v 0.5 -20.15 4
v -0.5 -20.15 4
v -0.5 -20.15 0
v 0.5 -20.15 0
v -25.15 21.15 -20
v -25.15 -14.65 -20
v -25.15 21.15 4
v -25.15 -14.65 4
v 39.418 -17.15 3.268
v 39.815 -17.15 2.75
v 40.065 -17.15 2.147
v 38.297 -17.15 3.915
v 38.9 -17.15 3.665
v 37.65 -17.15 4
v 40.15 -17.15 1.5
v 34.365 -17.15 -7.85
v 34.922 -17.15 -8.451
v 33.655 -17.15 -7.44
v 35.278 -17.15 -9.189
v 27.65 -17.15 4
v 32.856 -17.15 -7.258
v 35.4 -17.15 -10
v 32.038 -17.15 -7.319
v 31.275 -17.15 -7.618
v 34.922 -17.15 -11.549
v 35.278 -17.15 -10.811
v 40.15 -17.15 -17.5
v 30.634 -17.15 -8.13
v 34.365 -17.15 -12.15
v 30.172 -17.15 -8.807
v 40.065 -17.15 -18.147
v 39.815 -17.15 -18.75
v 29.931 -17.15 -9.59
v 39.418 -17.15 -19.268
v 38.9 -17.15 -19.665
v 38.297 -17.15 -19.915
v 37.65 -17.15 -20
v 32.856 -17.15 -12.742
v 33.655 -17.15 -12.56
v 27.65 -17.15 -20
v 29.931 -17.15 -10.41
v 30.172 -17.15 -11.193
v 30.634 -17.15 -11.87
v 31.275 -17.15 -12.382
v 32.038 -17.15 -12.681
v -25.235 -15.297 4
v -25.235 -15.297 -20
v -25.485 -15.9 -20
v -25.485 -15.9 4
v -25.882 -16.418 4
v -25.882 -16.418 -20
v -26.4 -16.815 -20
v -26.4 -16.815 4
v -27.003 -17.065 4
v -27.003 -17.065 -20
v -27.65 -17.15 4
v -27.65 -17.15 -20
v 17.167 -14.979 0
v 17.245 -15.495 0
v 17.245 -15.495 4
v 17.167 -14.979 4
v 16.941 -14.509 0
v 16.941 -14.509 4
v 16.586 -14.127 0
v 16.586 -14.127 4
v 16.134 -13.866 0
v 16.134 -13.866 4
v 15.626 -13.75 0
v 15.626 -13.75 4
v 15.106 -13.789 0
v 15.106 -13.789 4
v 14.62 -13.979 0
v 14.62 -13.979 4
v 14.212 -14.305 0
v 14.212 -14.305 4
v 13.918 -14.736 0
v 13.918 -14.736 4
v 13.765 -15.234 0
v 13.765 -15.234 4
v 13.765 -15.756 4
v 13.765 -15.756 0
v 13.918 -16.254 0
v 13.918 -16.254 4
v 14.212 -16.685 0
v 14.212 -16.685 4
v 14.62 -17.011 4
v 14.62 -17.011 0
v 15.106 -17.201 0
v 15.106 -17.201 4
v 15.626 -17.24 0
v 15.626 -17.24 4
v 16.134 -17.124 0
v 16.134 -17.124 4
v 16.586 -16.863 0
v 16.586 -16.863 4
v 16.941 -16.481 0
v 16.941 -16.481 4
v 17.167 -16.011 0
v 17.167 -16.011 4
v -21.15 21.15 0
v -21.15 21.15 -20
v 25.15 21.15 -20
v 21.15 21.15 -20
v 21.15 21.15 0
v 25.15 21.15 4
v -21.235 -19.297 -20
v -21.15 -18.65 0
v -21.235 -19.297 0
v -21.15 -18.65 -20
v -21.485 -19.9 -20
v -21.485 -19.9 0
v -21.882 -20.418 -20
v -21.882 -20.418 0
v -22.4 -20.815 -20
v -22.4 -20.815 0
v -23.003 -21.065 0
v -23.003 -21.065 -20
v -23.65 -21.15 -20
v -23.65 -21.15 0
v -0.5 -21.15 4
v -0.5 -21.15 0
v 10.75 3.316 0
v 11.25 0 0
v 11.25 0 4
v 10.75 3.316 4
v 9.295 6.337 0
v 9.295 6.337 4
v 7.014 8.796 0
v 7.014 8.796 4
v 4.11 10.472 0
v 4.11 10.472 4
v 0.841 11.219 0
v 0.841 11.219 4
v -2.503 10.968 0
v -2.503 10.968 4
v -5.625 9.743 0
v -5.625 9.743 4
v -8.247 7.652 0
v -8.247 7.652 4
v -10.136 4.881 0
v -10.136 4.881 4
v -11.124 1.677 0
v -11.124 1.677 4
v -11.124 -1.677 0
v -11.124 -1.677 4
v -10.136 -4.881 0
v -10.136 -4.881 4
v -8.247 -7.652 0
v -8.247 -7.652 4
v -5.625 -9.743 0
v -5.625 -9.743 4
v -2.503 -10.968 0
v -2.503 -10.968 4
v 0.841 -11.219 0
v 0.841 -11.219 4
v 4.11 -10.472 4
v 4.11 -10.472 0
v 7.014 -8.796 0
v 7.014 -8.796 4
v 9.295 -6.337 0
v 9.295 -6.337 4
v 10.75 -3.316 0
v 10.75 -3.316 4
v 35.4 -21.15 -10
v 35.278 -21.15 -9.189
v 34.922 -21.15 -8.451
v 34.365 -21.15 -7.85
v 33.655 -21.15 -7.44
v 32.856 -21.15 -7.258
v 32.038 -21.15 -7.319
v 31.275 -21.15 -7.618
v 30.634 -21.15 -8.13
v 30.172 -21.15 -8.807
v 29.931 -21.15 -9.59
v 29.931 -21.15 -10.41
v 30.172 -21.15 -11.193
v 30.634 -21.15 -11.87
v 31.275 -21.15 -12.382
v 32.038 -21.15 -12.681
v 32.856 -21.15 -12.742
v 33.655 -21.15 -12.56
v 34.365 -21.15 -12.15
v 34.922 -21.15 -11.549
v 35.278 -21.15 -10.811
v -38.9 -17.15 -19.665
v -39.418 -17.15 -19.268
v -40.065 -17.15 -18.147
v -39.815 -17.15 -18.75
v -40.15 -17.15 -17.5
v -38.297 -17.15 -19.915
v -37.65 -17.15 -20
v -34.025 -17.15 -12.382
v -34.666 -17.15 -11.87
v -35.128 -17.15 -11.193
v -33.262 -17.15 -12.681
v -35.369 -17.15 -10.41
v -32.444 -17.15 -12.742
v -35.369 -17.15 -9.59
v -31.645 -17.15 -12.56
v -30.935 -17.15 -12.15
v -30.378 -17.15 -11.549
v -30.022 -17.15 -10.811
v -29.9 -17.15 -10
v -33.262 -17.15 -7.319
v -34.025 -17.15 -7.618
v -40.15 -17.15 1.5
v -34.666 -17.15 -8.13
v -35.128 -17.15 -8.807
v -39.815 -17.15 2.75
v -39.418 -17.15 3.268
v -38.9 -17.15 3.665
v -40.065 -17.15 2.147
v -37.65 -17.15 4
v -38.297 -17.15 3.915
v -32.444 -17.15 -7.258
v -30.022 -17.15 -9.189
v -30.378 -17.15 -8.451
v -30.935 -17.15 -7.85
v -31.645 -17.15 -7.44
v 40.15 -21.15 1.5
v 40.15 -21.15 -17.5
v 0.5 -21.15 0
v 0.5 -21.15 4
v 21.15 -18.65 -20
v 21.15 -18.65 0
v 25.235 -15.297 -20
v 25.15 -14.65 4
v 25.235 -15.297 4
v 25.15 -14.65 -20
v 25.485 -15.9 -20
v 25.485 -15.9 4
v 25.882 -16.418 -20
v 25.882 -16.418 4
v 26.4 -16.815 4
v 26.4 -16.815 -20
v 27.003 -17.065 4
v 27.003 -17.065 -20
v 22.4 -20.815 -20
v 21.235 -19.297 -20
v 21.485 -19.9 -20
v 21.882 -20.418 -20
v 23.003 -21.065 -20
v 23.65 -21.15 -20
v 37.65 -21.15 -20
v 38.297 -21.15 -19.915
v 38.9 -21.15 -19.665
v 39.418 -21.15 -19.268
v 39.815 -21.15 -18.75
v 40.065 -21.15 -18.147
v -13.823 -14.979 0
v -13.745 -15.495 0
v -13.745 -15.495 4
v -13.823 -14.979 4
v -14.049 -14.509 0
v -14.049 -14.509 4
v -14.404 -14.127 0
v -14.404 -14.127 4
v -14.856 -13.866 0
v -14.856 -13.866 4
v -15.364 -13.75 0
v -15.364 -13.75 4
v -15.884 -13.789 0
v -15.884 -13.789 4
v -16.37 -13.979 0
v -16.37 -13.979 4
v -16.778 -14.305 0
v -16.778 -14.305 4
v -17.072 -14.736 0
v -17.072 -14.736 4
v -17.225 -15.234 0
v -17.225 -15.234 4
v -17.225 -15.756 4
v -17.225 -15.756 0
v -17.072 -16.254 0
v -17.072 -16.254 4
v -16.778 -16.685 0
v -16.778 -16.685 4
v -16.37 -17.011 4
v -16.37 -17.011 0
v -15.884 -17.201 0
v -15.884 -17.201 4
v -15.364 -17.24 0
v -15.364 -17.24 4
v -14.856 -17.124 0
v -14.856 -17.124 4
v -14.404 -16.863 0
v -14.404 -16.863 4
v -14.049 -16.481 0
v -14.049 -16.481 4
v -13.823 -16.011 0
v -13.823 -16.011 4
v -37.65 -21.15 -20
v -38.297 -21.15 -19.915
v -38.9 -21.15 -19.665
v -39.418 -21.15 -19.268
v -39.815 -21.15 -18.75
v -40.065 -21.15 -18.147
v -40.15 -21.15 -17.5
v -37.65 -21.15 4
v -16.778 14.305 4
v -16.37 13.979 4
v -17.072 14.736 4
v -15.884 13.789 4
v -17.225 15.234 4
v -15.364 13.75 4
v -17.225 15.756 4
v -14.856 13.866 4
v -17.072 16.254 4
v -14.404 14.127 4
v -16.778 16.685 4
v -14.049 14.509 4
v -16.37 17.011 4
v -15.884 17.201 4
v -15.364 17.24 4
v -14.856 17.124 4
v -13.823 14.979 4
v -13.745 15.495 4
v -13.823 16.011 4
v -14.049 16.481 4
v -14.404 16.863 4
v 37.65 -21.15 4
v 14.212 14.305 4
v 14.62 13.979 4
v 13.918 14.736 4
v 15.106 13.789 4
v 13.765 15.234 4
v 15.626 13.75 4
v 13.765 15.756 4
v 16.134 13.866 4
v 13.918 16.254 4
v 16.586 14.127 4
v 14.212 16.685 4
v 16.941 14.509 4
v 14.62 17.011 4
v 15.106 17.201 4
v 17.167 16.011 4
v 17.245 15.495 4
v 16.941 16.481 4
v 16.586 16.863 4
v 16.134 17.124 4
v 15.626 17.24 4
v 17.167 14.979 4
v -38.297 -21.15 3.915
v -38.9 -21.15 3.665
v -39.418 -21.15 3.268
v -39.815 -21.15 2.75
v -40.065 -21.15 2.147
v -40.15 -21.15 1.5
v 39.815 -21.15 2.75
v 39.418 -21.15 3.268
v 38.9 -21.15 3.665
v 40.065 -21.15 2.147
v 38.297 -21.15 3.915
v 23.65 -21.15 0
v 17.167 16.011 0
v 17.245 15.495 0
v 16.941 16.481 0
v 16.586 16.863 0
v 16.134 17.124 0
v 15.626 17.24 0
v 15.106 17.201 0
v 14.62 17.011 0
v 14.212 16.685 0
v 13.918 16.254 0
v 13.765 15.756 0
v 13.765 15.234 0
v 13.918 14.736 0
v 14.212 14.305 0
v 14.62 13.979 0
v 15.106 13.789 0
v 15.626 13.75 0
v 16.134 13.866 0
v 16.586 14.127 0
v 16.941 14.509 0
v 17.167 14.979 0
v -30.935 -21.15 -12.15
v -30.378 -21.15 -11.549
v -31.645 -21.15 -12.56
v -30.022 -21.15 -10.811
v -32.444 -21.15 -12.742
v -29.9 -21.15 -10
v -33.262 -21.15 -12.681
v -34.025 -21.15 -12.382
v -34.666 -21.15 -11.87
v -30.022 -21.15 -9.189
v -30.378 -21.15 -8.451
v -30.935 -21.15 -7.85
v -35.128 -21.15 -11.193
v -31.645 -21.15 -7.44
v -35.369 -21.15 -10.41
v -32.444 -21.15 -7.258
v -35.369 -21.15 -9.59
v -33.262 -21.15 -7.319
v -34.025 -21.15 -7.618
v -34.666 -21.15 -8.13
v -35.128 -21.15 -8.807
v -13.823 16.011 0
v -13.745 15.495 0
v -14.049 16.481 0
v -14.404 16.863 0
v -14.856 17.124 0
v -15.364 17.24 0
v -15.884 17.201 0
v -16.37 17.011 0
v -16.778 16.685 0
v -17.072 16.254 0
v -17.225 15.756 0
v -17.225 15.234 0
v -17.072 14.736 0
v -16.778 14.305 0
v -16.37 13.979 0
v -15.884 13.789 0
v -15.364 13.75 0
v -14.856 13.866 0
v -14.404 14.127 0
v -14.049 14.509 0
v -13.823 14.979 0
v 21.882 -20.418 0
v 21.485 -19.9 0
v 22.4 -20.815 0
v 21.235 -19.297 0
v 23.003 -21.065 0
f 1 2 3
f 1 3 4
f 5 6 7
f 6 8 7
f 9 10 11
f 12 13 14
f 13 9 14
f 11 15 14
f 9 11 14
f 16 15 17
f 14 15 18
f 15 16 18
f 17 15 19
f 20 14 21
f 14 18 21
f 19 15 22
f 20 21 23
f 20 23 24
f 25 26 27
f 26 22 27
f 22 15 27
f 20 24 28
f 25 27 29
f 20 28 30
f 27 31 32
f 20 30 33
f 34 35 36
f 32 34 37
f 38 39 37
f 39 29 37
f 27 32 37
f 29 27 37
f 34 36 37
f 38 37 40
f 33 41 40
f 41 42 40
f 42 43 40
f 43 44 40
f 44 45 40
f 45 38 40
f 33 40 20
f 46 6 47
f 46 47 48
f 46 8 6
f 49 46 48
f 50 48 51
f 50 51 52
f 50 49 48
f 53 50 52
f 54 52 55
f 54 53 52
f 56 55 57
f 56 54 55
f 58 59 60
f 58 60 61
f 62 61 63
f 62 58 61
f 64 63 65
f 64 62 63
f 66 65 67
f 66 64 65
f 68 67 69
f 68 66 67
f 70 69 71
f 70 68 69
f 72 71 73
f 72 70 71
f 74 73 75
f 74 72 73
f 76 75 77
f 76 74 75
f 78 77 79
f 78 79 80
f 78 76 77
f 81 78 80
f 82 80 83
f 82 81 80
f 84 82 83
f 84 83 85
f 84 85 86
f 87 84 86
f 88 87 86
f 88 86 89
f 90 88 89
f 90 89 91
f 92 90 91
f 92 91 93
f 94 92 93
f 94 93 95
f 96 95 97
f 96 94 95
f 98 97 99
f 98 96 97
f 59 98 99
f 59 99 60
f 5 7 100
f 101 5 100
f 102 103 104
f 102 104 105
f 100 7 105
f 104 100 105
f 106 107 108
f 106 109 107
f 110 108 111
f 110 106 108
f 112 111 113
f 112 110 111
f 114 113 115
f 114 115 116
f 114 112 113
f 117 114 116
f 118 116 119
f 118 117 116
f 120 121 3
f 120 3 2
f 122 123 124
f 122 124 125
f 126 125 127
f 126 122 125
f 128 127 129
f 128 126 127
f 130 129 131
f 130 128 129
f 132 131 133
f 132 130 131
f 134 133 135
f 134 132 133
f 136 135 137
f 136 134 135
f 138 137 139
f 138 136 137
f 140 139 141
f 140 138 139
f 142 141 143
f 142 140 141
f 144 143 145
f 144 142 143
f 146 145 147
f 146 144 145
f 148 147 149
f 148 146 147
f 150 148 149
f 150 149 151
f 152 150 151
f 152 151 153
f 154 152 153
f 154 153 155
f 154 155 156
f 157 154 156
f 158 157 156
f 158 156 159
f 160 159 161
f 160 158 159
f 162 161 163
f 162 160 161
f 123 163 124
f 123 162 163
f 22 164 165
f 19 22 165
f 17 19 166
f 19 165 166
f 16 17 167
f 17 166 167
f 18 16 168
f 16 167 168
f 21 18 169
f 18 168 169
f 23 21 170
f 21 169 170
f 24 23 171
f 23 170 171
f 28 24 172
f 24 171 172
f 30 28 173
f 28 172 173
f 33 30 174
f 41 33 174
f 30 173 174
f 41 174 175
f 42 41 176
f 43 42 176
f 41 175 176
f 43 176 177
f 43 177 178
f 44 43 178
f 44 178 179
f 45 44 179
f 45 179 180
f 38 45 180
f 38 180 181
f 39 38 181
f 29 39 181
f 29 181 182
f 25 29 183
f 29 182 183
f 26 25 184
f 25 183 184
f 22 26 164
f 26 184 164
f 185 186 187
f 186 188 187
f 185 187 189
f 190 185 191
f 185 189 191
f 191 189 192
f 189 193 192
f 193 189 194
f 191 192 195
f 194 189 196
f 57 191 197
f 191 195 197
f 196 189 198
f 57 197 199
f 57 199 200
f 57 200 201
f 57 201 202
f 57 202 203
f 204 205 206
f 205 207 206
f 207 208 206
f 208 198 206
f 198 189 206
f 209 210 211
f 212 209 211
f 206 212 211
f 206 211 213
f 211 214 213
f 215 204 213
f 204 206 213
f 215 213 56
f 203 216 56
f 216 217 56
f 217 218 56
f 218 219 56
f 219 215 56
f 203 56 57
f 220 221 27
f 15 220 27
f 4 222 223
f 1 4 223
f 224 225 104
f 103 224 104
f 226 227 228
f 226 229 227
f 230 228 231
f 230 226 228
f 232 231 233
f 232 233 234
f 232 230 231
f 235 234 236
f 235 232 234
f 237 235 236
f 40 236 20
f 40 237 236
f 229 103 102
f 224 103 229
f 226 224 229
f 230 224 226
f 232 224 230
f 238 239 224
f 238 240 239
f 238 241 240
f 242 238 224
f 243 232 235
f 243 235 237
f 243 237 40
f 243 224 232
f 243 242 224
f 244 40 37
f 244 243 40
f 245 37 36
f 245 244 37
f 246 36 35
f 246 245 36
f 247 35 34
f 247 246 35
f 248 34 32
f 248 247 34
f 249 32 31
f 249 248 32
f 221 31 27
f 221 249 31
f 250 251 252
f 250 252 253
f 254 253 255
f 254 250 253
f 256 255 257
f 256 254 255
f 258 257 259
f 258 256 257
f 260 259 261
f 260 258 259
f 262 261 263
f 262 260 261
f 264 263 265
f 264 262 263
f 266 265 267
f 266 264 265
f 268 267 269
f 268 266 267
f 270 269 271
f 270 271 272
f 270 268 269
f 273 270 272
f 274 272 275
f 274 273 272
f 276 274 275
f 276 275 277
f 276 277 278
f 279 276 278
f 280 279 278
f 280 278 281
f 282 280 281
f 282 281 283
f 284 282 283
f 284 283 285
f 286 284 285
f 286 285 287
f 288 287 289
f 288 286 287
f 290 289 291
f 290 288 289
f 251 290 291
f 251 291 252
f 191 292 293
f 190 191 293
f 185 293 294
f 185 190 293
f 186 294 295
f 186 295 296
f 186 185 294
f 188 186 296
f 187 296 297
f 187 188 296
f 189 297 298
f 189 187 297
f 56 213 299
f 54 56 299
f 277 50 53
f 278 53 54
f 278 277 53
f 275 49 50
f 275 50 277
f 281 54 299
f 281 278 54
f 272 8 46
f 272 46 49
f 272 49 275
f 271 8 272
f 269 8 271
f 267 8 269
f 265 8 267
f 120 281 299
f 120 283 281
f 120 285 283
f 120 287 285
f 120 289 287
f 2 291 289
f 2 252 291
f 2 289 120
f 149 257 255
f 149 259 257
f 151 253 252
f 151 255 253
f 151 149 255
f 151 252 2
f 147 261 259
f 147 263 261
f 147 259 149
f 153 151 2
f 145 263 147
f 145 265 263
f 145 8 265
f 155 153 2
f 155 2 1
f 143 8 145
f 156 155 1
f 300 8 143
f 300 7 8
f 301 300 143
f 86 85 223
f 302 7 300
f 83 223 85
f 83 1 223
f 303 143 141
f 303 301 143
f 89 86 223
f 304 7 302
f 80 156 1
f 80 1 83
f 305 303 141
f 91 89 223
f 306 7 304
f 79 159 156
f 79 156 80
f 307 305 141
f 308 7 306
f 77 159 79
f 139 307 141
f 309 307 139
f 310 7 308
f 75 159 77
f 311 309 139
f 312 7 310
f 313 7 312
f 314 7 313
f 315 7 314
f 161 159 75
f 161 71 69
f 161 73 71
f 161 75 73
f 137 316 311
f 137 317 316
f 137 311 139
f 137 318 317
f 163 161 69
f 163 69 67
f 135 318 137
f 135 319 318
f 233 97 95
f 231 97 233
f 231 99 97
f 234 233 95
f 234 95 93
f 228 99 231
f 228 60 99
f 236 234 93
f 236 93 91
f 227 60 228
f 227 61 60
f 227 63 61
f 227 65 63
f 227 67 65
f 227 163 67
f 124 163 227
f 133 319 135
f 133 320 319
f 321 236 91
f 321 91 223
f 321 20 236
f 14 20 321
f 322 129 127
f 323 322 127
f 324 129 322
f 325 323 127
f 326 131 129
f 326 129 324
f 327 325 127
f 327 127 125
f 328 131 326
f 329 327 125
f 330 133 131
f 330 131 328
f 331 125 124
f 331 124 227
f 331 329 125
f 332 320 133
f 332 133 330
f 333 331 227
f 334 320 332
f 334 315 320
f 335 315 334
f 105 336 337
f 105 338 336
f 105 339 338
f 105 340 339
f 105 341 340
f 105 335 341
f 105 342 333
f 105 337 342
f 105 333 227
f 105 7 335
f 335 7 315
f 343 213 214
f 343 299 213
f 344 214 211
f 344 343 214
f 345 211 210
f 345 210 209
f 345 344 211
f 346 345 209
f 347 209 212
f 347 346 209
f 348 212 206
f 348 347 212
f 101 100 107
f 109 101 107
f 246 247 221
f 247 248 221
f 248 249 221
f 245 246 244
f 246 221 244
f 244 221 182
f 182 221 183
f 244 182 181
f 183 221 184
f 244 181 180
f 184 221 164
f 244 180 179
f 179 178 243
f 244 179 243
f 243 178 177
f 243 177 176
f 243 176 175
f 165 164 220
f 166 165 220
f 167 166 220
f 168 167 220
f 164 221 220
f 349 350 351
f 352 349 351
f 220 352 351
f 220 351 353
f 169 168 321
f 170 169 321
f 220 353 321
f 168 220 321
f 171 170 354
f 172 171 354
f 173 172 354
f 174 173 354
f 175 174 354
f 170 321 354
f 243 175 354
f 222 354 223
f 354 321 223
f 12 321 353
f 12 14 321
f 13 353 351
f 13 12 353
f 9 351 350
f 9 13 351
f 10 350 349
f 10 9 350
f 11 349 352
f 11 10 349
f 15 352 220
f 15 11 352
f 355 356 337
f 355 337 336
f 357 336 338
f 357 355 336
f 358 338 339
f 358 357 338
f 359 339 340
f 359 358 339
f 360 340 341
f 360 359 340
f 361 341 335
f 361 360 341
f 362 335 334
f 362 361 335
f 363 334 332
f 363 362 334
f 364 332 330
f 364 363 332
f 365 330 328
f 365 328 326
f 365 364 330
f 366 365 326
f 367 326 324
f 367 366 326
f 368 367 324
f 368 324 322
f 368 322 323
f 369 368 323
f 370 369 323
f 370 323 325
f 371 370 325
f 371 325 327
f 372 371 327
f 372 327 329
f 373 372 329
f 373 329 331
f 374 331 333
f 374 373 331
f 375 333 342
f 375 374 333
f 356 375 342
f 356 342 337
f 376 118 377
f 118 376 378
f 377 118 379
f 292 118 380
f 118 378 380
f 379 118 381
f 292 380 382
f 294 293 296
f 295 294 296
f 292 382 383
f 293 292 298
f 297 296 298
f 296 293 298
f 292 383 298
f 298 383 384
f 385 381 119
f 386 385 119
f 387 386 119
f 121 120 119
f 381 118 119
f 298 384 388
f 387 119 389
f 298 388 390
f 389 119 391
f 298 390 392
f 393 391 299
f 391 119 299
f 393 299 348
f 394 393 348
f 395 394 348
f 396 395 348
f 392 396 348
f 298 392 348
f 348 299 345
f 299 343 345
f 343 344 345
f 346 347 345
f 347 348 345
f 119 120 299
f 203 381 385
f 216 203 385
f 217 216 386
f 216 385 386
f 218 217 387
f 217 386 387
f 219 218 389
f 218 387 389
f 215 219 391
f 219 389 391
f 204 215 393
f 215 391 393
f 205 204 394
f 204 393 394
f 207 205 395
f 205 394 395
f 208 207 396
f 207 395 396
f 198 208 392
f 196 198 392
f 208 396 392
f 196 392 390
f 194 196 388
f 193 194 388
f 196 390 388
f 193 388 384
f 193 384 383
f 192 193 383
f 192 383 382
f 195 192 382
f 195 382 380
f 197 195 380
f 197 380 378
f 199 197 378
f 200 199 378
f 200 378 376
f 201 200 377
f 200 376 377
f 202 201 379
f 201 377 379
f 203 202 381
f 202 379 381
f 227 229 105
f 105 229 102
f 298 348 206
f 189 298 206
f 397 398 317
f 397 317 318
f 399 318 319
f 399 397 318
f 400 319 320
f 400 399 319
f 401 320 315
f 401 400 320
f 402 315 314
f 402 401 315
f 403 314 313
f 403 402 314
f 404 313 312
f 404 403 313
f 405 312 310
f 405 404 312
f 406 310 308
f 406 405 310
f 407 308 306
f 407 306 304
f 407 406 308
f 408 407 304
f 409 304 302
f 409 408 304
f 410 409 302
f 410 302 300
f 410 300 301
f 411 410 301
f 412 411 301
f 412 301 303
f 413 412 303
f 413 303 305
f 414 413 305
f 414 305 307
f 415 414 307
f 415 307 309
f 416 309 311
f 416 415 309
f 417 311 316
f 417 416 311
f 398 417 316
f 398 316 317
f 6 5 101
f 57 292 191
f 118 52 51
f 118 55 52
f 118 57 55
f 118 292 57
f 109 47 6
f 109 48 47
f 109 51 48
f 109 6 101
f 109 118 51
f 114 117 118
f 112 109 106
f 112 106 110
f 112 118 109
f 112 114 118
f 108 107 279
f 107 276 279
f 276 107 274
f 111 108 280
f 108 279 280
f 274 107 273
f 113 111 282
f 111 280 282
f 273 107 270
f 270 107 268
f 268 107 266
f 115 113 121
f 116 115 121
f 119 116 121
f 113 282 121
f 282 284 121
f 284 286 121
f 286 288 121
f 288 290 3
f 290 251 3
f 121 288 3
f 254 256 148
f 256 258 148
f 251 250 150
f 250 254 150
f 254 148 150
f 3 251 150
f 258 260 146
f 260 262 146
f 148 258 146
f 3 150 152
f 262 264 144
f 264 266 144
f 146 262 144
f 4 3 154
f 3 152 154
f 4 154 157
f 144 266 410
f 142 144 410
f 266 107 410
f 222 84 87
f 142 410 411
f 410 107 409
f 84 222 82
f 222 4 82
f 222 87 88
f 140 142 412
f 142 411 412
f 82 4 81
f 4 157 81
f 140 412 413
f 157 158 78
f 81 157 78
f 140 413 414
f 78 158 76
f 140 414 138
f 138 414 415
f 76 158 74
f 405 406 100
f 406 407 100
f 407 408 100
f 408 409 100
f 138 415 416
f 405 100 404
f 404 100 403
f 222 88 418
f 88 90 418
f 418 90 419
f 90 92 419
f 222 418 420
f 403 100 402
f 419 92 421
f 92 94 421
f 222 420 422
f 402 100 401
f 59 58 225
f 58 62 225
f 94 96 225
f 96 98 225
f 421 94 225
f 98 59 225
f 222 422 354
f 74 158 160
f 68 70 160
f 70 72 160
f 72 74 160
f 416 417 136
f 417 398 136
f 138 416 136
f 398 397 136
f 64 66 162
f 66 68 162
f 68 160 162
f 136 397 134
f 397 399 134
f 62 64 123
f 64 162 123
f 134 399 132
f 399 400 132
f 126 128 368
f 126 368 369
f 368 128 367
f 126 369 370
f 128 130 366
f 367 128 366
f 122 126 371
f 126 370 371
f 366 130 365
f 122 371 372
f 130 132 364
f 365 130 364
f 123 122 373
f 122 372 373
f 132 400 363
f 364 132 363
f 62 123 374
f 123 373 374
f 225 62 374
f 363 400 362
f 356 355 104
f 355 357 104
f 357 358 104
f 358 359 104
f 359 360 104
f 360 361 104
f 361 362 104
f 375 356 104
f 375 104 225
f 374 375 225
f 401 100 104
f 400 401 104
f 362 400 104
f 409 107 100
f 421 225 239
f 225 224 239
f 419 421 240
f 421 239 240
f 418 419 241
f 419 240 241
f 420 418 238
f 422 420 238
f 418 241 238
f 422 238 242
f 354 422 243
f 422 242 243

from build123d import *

# Parameters (mm, degrees)
F0_W     = 4
F0_H     = 38.3
F0_R     = 1.75
F0_R_2   = 11.25
F1_DEPTH = 4
F3_DEPTH = 20
F4_R     = 2.75
F5_DEPTH = 4
F6_R     = 2.5
F7_W     = 0.5
F7_H     = 4
F8_DEPTH = 1


with BuildPart() as f1:
    # F0 (on Top) → F1 (new body)
    with BuildSketch(Plane.XY):
        with Locations((-23.15, 2)):
            Rectangle(F0_W, F0_H)
        Polygon((21.15, 21.15), (-21.15, 21.15), (-21.15, -17.15), (-21.15, -21.15), (21.15, -21.15), (21.15, -17.15), align=None)
        with Locations((-15.495, -15.495)):
            Circle(F0_R, mode=Mode.SUBTRACT)
        with Locations((15.495, -15.495)):
            Circle(F0_R, mode=Mode.SUBTRACT)
        with Locations((-15.495, 15.495)):
            Circle(F0_R, mode=Mode.SUBTRACT)
        Circle(F0_R_2, mode=Mode.SUBTRACT)
        with Locations((15.495, 15.495)):
            Circle(F0_R, mode=Mode.SUBTRACT)
        with Locations((23.15, 2)):
            Rectangle(F0_W, F0_H)
        Polygon((-21.15, -21.15), (-21.15, -17.15), (-25.15, -17.15), (-40.15, -17.15), (-40.15, -21.15), align=None)
        Polygon((25.15, -17.15), (21.15, -17.15), (21.15, -21.15), (40.15, -21.15), (40.15, -17.15), align=None)
    extrude(amount=F1_DEPTH)

    # F2 (on face) → F3 (join)
    with BuildSketch(Plane(origin=(0, 0, 0), x_dir=(1, 0, 0), z_dir=(0, 0, -1))):
        Polygon((-25.15, -21.15), (-21.15, -21.15), (-21.15, 17.15), (-21.15, 21.15), (-40.15, 21.15), (-40.15, 17.15), (-25.15, 17.15), align=None)
        Polygon((21.15, 17.15), (21.15, -21.15), (25.15, -21.15), (25.15, 17.15), (40.15, 17.15), (40.15, 21.15), (21.15, 21.15), align=None)
    extrude(amount=F3_DEPTH)

    # F4 (on face) → F5 (cut, through all)
    with BuildSketch(Plane.XZ.offset(21.15)):
        with Locations((-32.65, -10)):
            Circle(F4_R)
        with Locations((32.65, -10)):
            Circle(F4_R)
    extrude(amount=-F5_DEPTH, mode=Mode.SUBTRACT)

    # F6
    f6_edges = [f1.edges().sort_by_distance(p)[0] for p in [
        (-40.15, -19.15, 4),
        (-40.15, -19.15, -20),
        (40.15, -19.15, -20),
        (40.15, -19.15, 4),
        (25.15, -17.15, -8),
        (-25.15, -17.15, -8),
        (21.15, -21.15, -10),
        (-21.15, -21.15, -10),
    ]]
    fillet(f6_edges, radius=F6_R)

    # F7 (on face) → F8 (cut)
    with BuildSketch(Plane.XZ.offset(21.15)):
        with Locations((0.25, 2)):
            Rectangle(F7_W, F7_H)
        with Locations((-0.25, 2)):
            Rectangle(F7_W, F7_H)
    extrude(amount=-F8_DEPTH, mode=Mode.SUBTRACT)


solid = f1.part
